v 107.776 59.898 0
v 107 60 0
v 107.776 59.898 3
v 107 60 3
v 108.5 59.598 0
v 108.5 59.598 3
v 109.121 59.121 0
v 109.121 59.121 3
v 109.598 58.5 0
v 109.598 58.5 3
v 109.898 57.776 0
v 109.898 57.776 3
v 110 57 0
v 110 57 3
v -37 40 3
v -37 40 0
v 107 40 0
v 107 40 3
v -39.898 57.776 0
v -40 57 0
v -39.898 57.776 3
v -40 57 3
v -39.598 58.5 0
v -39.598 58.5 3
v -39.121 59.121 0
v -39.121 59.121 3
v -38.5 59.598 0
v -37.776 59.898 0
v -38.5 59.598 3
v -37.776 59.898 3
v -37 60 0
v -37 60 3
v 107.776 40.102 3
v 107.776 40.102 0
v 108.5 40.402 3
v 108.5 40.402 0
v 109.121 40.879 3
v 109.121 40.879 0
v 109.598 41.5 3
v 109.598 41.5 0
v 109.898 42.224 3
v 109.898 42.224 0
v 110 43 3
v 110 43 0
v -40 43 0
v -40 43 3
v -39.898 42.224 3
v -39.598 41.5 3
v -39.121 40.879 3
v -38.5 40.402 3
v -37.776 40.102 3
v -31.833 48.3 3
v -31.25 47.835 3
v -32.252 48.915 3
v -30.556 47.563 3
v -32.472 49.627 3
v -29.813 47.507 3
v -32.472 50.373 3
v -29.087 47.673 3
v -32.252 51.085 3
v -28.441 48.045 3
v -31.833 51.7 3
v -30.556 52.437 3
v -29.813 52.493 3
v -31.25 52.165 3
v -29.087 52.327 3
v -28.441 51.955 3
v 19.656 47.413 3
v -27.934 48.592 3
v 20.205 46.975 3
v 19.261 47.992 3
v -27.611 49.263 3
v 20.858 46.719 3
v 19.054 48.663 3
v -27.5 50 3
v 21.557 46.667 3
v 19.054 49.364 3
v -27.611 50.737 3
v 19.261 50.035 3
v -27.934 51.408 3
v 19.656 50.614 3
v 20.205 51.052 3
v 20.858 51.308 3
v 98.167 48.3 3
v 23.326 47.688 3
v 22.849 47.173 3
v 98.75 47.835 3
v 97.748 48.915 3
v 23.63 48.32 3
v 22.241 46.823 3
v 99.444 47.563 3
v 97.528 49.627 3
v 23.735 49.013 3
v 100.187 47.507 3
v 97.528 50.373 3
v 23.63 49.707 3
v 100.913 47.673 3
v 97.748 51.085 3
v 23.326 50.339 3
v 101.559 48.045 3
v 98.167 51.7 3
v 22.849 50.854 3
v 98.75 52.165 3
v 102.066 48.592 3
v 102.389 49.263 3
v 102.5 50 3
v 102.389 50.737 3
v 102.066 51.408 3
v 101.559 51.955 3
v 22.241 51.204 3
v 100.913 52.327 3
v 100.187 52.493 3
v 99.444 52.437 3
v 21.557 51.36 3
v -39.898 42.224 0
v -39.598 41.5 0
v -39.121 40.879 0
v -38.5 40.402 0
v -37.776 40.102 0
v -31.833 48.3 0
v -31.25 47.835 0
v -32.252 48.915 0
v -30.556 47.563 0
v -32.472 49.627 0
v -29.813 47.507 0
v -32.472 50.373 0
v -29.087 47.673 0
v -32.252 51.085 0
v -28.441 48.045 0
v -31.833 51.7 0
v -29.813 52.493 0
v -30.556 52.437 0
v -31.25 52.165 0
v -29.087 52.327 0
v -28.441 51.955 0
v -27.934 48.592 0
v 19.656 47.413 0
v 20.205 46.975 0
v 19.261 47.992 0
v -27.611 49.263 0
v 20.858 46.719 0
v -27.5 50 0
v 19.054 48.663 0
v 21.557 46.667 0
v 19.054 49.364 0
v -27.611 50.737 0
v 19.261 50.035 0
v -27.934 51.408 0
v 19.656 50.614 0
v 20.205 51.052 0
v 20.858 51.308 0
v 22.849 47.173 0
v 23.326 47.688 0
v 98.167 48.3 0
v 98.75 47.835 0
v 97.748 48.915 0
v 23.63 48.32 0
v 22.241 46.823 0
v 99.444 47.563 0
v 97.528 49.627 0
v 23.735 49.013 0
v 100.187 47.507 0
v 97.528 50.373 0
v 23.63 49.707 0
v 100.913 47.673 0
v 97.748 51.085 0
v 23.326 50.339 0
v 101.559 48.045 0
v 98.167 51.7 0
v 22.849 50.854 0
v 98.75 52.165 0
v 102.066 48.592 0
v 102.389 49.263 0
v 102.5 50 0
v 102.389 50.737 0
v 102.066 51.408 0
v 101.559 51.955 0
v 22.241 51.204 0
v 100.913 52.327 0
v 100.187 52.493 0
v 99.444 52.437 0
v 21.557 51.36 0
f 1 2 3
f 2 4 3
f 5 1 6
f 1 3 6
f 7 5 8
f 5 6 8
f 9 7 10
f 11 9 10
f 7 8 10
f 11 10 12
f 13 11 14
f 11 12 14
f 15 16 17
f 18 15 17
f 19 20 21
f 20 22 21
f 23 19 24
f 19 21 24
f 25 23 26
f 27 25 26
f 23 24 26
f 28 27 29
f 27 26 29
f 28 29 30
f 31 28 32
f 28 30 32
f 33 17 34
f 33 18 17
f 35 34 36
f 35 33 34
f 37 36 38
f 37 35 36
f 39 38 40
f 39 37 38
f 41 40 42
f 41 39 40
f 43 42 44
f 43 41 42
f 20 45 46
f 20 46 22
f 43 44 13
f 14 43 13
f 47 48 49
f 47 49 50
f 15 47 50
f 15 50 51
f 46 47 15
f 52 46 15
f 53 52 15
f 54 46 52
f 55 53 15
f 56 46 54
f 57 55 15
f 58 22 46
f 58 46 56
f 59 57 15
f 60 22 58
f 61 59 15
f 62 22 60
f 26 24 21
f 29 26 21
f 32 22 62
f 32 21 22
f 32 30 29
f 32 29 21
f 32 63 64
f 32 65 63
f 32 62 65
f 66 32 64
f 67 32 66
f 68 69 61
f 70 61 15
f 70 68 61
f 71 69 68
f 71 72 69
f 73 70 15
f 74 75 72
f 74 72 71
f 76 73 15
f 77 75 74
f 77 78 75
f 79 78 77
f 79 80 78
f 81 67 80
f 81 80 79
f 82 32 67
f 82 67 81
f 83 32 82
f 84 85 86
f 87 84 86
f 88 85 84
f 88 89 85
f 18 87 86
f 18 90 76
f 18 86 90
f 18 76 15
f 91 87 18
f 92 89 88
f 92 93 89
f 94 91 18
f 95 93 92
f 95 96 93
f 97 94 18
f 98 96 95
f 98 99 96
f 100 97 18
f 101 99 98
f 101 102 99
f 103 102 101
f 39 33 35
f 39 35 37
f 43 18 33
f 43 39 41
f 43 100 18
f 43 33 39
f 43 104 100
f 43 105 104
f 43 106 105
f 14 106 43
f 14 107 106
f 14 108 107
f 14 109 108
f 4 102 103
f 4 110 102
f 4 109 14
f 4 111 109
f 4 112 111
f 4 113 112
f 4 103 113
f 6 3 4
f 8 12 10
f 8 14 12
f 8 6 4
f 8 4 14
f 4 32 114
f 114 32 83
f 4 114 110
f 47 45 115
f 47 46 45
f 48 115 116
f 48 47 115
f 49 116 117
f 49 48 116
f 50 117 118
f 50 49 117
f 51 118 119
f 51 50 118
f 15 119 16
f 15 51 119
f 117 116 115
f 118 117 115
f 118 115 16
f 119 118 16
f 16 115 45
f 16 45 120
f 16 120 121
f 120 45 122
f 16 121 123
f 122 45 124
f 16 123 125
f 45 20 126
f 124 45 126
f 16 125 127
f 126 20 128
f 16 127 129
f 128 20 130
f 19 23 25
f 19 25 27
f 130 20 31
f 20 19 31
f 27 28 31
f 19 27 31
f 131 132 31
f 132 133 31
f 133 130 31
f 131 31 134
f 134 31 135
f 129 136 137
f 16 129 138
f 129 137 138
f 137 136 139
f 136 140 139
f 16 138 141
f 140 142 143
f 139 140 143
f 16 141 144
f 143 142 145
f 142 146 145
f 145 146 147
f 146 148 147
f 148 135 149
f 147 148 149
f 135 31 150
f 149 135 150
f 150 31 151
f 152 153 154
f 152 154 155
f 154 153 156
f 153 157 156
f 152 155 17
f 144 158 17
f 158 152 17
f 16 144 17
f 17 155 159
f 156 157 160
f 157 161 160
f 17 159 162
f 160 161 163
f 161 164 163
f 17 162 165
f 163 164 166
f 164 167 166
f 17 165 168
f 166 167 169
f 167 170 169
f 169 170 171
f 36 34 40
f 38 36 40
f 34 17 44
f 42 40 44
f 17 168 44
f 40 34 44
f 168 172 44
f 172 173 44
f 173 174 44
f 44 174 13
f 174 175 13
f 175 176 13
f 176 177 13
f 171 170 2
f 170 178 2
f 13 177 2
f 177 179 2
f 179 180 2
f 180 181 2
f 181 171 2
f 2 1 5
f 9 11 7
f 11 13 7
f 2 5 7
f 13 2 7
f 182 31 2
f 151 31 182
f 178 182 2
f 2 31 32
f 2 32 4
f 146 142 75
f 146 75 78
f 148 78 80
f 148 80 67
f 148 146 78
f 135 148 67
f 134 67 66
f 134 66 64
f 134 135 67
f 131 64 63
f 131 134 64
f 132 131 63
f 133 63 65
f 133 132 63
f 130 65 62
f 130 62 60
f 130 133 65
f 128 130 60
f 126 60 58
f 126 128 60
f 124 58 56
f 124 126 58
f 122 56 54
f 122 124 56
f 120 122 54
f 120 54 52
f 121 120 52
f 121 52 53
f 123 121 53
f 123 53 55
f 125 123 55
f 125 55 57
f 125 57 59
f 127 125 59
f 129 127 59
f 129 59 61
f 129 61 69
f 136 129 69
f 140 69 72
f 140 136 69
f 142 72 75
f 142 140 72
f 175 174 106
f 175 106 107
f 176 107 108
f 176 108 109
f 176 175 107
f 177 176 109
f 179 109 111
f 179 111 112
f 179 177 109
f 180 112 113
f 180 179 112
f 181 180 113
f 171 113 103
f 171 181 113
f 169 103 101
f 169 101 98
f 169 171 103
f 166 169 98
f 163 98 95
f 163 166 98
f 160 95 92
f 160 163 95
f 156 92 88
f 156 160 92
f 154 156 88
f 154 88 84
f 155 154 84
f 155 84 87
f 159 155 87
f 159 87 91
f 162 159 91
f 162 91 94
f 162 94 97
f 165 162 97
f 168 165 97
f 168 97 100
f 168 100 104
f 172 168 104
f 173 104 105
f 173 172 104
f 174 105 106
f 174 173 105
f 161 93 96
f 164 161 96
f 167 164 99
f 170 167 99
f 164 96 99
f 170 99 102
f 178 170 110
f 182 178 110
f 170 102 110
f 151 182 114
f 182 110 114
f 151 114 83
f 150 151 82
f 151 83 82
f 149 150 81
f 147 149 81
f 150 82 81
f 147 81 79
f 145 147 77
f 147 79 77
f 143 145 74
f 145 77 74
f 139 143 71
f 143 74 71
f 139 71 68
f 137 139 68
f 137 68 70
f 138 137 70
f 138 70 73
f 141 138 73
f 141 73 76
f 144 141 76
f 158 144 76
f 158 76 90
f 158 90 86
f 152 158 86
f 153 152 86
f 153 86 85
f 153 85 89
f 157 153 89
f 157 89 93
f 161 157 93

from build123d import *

# Parameters (mm, degrees)
SKETCH1_W           = 150
SKETCH1_H           = 20
SKETCH1_R           = 2.5
BOSS_EXTRUDE1_DEPTH = 3
FILLET1_R           = 3
SKETCH2_R           = 2.353501923
CUT_EXTRUDE1_DEPTH  = 108


with BuildPart() as part:
    # Sketch1 → Boss-Extrude1 (new body)
    with BuildSketch(Plane.XY):
        with Locations((35, 50)):
            Rectangle(SKETCH1_W, SKETCH1_H)
        with Locations((-30, 50)):
            Circle(SKETCH1_R, mode=Mode.SUBTRACT)
        with Locations((100, 50)):
            Circle(SKETCH1_R, mode=Mode.SUBTRACT)
    extrude(amount=BOSS_EXTRUDE1_DEPTH)

    # Fillet1
    fillet1_edges = [part.edges().sort_by_distance(p)[0] for p in [
        (110, 40, 1.5),
        (-40, 40, 1.5),
        (-40, 60, 1.5),
        (110, 60, 1.5),
    ]]
    fillet(fillet1_edges, radius=FILLET1_R)

    # Sketch2 → Cut-Extrude1 (cut)
    with BuildSketch(Plane.XY.offset(3)):
        with Locations((21.381283536, 49.013493537)):
            Circle(SKETCH2_R)
    extrude(amount=-CUT_EXTRUDE1_DEPTH, mode=Mode.SUBTRACT)


solid = part.part
